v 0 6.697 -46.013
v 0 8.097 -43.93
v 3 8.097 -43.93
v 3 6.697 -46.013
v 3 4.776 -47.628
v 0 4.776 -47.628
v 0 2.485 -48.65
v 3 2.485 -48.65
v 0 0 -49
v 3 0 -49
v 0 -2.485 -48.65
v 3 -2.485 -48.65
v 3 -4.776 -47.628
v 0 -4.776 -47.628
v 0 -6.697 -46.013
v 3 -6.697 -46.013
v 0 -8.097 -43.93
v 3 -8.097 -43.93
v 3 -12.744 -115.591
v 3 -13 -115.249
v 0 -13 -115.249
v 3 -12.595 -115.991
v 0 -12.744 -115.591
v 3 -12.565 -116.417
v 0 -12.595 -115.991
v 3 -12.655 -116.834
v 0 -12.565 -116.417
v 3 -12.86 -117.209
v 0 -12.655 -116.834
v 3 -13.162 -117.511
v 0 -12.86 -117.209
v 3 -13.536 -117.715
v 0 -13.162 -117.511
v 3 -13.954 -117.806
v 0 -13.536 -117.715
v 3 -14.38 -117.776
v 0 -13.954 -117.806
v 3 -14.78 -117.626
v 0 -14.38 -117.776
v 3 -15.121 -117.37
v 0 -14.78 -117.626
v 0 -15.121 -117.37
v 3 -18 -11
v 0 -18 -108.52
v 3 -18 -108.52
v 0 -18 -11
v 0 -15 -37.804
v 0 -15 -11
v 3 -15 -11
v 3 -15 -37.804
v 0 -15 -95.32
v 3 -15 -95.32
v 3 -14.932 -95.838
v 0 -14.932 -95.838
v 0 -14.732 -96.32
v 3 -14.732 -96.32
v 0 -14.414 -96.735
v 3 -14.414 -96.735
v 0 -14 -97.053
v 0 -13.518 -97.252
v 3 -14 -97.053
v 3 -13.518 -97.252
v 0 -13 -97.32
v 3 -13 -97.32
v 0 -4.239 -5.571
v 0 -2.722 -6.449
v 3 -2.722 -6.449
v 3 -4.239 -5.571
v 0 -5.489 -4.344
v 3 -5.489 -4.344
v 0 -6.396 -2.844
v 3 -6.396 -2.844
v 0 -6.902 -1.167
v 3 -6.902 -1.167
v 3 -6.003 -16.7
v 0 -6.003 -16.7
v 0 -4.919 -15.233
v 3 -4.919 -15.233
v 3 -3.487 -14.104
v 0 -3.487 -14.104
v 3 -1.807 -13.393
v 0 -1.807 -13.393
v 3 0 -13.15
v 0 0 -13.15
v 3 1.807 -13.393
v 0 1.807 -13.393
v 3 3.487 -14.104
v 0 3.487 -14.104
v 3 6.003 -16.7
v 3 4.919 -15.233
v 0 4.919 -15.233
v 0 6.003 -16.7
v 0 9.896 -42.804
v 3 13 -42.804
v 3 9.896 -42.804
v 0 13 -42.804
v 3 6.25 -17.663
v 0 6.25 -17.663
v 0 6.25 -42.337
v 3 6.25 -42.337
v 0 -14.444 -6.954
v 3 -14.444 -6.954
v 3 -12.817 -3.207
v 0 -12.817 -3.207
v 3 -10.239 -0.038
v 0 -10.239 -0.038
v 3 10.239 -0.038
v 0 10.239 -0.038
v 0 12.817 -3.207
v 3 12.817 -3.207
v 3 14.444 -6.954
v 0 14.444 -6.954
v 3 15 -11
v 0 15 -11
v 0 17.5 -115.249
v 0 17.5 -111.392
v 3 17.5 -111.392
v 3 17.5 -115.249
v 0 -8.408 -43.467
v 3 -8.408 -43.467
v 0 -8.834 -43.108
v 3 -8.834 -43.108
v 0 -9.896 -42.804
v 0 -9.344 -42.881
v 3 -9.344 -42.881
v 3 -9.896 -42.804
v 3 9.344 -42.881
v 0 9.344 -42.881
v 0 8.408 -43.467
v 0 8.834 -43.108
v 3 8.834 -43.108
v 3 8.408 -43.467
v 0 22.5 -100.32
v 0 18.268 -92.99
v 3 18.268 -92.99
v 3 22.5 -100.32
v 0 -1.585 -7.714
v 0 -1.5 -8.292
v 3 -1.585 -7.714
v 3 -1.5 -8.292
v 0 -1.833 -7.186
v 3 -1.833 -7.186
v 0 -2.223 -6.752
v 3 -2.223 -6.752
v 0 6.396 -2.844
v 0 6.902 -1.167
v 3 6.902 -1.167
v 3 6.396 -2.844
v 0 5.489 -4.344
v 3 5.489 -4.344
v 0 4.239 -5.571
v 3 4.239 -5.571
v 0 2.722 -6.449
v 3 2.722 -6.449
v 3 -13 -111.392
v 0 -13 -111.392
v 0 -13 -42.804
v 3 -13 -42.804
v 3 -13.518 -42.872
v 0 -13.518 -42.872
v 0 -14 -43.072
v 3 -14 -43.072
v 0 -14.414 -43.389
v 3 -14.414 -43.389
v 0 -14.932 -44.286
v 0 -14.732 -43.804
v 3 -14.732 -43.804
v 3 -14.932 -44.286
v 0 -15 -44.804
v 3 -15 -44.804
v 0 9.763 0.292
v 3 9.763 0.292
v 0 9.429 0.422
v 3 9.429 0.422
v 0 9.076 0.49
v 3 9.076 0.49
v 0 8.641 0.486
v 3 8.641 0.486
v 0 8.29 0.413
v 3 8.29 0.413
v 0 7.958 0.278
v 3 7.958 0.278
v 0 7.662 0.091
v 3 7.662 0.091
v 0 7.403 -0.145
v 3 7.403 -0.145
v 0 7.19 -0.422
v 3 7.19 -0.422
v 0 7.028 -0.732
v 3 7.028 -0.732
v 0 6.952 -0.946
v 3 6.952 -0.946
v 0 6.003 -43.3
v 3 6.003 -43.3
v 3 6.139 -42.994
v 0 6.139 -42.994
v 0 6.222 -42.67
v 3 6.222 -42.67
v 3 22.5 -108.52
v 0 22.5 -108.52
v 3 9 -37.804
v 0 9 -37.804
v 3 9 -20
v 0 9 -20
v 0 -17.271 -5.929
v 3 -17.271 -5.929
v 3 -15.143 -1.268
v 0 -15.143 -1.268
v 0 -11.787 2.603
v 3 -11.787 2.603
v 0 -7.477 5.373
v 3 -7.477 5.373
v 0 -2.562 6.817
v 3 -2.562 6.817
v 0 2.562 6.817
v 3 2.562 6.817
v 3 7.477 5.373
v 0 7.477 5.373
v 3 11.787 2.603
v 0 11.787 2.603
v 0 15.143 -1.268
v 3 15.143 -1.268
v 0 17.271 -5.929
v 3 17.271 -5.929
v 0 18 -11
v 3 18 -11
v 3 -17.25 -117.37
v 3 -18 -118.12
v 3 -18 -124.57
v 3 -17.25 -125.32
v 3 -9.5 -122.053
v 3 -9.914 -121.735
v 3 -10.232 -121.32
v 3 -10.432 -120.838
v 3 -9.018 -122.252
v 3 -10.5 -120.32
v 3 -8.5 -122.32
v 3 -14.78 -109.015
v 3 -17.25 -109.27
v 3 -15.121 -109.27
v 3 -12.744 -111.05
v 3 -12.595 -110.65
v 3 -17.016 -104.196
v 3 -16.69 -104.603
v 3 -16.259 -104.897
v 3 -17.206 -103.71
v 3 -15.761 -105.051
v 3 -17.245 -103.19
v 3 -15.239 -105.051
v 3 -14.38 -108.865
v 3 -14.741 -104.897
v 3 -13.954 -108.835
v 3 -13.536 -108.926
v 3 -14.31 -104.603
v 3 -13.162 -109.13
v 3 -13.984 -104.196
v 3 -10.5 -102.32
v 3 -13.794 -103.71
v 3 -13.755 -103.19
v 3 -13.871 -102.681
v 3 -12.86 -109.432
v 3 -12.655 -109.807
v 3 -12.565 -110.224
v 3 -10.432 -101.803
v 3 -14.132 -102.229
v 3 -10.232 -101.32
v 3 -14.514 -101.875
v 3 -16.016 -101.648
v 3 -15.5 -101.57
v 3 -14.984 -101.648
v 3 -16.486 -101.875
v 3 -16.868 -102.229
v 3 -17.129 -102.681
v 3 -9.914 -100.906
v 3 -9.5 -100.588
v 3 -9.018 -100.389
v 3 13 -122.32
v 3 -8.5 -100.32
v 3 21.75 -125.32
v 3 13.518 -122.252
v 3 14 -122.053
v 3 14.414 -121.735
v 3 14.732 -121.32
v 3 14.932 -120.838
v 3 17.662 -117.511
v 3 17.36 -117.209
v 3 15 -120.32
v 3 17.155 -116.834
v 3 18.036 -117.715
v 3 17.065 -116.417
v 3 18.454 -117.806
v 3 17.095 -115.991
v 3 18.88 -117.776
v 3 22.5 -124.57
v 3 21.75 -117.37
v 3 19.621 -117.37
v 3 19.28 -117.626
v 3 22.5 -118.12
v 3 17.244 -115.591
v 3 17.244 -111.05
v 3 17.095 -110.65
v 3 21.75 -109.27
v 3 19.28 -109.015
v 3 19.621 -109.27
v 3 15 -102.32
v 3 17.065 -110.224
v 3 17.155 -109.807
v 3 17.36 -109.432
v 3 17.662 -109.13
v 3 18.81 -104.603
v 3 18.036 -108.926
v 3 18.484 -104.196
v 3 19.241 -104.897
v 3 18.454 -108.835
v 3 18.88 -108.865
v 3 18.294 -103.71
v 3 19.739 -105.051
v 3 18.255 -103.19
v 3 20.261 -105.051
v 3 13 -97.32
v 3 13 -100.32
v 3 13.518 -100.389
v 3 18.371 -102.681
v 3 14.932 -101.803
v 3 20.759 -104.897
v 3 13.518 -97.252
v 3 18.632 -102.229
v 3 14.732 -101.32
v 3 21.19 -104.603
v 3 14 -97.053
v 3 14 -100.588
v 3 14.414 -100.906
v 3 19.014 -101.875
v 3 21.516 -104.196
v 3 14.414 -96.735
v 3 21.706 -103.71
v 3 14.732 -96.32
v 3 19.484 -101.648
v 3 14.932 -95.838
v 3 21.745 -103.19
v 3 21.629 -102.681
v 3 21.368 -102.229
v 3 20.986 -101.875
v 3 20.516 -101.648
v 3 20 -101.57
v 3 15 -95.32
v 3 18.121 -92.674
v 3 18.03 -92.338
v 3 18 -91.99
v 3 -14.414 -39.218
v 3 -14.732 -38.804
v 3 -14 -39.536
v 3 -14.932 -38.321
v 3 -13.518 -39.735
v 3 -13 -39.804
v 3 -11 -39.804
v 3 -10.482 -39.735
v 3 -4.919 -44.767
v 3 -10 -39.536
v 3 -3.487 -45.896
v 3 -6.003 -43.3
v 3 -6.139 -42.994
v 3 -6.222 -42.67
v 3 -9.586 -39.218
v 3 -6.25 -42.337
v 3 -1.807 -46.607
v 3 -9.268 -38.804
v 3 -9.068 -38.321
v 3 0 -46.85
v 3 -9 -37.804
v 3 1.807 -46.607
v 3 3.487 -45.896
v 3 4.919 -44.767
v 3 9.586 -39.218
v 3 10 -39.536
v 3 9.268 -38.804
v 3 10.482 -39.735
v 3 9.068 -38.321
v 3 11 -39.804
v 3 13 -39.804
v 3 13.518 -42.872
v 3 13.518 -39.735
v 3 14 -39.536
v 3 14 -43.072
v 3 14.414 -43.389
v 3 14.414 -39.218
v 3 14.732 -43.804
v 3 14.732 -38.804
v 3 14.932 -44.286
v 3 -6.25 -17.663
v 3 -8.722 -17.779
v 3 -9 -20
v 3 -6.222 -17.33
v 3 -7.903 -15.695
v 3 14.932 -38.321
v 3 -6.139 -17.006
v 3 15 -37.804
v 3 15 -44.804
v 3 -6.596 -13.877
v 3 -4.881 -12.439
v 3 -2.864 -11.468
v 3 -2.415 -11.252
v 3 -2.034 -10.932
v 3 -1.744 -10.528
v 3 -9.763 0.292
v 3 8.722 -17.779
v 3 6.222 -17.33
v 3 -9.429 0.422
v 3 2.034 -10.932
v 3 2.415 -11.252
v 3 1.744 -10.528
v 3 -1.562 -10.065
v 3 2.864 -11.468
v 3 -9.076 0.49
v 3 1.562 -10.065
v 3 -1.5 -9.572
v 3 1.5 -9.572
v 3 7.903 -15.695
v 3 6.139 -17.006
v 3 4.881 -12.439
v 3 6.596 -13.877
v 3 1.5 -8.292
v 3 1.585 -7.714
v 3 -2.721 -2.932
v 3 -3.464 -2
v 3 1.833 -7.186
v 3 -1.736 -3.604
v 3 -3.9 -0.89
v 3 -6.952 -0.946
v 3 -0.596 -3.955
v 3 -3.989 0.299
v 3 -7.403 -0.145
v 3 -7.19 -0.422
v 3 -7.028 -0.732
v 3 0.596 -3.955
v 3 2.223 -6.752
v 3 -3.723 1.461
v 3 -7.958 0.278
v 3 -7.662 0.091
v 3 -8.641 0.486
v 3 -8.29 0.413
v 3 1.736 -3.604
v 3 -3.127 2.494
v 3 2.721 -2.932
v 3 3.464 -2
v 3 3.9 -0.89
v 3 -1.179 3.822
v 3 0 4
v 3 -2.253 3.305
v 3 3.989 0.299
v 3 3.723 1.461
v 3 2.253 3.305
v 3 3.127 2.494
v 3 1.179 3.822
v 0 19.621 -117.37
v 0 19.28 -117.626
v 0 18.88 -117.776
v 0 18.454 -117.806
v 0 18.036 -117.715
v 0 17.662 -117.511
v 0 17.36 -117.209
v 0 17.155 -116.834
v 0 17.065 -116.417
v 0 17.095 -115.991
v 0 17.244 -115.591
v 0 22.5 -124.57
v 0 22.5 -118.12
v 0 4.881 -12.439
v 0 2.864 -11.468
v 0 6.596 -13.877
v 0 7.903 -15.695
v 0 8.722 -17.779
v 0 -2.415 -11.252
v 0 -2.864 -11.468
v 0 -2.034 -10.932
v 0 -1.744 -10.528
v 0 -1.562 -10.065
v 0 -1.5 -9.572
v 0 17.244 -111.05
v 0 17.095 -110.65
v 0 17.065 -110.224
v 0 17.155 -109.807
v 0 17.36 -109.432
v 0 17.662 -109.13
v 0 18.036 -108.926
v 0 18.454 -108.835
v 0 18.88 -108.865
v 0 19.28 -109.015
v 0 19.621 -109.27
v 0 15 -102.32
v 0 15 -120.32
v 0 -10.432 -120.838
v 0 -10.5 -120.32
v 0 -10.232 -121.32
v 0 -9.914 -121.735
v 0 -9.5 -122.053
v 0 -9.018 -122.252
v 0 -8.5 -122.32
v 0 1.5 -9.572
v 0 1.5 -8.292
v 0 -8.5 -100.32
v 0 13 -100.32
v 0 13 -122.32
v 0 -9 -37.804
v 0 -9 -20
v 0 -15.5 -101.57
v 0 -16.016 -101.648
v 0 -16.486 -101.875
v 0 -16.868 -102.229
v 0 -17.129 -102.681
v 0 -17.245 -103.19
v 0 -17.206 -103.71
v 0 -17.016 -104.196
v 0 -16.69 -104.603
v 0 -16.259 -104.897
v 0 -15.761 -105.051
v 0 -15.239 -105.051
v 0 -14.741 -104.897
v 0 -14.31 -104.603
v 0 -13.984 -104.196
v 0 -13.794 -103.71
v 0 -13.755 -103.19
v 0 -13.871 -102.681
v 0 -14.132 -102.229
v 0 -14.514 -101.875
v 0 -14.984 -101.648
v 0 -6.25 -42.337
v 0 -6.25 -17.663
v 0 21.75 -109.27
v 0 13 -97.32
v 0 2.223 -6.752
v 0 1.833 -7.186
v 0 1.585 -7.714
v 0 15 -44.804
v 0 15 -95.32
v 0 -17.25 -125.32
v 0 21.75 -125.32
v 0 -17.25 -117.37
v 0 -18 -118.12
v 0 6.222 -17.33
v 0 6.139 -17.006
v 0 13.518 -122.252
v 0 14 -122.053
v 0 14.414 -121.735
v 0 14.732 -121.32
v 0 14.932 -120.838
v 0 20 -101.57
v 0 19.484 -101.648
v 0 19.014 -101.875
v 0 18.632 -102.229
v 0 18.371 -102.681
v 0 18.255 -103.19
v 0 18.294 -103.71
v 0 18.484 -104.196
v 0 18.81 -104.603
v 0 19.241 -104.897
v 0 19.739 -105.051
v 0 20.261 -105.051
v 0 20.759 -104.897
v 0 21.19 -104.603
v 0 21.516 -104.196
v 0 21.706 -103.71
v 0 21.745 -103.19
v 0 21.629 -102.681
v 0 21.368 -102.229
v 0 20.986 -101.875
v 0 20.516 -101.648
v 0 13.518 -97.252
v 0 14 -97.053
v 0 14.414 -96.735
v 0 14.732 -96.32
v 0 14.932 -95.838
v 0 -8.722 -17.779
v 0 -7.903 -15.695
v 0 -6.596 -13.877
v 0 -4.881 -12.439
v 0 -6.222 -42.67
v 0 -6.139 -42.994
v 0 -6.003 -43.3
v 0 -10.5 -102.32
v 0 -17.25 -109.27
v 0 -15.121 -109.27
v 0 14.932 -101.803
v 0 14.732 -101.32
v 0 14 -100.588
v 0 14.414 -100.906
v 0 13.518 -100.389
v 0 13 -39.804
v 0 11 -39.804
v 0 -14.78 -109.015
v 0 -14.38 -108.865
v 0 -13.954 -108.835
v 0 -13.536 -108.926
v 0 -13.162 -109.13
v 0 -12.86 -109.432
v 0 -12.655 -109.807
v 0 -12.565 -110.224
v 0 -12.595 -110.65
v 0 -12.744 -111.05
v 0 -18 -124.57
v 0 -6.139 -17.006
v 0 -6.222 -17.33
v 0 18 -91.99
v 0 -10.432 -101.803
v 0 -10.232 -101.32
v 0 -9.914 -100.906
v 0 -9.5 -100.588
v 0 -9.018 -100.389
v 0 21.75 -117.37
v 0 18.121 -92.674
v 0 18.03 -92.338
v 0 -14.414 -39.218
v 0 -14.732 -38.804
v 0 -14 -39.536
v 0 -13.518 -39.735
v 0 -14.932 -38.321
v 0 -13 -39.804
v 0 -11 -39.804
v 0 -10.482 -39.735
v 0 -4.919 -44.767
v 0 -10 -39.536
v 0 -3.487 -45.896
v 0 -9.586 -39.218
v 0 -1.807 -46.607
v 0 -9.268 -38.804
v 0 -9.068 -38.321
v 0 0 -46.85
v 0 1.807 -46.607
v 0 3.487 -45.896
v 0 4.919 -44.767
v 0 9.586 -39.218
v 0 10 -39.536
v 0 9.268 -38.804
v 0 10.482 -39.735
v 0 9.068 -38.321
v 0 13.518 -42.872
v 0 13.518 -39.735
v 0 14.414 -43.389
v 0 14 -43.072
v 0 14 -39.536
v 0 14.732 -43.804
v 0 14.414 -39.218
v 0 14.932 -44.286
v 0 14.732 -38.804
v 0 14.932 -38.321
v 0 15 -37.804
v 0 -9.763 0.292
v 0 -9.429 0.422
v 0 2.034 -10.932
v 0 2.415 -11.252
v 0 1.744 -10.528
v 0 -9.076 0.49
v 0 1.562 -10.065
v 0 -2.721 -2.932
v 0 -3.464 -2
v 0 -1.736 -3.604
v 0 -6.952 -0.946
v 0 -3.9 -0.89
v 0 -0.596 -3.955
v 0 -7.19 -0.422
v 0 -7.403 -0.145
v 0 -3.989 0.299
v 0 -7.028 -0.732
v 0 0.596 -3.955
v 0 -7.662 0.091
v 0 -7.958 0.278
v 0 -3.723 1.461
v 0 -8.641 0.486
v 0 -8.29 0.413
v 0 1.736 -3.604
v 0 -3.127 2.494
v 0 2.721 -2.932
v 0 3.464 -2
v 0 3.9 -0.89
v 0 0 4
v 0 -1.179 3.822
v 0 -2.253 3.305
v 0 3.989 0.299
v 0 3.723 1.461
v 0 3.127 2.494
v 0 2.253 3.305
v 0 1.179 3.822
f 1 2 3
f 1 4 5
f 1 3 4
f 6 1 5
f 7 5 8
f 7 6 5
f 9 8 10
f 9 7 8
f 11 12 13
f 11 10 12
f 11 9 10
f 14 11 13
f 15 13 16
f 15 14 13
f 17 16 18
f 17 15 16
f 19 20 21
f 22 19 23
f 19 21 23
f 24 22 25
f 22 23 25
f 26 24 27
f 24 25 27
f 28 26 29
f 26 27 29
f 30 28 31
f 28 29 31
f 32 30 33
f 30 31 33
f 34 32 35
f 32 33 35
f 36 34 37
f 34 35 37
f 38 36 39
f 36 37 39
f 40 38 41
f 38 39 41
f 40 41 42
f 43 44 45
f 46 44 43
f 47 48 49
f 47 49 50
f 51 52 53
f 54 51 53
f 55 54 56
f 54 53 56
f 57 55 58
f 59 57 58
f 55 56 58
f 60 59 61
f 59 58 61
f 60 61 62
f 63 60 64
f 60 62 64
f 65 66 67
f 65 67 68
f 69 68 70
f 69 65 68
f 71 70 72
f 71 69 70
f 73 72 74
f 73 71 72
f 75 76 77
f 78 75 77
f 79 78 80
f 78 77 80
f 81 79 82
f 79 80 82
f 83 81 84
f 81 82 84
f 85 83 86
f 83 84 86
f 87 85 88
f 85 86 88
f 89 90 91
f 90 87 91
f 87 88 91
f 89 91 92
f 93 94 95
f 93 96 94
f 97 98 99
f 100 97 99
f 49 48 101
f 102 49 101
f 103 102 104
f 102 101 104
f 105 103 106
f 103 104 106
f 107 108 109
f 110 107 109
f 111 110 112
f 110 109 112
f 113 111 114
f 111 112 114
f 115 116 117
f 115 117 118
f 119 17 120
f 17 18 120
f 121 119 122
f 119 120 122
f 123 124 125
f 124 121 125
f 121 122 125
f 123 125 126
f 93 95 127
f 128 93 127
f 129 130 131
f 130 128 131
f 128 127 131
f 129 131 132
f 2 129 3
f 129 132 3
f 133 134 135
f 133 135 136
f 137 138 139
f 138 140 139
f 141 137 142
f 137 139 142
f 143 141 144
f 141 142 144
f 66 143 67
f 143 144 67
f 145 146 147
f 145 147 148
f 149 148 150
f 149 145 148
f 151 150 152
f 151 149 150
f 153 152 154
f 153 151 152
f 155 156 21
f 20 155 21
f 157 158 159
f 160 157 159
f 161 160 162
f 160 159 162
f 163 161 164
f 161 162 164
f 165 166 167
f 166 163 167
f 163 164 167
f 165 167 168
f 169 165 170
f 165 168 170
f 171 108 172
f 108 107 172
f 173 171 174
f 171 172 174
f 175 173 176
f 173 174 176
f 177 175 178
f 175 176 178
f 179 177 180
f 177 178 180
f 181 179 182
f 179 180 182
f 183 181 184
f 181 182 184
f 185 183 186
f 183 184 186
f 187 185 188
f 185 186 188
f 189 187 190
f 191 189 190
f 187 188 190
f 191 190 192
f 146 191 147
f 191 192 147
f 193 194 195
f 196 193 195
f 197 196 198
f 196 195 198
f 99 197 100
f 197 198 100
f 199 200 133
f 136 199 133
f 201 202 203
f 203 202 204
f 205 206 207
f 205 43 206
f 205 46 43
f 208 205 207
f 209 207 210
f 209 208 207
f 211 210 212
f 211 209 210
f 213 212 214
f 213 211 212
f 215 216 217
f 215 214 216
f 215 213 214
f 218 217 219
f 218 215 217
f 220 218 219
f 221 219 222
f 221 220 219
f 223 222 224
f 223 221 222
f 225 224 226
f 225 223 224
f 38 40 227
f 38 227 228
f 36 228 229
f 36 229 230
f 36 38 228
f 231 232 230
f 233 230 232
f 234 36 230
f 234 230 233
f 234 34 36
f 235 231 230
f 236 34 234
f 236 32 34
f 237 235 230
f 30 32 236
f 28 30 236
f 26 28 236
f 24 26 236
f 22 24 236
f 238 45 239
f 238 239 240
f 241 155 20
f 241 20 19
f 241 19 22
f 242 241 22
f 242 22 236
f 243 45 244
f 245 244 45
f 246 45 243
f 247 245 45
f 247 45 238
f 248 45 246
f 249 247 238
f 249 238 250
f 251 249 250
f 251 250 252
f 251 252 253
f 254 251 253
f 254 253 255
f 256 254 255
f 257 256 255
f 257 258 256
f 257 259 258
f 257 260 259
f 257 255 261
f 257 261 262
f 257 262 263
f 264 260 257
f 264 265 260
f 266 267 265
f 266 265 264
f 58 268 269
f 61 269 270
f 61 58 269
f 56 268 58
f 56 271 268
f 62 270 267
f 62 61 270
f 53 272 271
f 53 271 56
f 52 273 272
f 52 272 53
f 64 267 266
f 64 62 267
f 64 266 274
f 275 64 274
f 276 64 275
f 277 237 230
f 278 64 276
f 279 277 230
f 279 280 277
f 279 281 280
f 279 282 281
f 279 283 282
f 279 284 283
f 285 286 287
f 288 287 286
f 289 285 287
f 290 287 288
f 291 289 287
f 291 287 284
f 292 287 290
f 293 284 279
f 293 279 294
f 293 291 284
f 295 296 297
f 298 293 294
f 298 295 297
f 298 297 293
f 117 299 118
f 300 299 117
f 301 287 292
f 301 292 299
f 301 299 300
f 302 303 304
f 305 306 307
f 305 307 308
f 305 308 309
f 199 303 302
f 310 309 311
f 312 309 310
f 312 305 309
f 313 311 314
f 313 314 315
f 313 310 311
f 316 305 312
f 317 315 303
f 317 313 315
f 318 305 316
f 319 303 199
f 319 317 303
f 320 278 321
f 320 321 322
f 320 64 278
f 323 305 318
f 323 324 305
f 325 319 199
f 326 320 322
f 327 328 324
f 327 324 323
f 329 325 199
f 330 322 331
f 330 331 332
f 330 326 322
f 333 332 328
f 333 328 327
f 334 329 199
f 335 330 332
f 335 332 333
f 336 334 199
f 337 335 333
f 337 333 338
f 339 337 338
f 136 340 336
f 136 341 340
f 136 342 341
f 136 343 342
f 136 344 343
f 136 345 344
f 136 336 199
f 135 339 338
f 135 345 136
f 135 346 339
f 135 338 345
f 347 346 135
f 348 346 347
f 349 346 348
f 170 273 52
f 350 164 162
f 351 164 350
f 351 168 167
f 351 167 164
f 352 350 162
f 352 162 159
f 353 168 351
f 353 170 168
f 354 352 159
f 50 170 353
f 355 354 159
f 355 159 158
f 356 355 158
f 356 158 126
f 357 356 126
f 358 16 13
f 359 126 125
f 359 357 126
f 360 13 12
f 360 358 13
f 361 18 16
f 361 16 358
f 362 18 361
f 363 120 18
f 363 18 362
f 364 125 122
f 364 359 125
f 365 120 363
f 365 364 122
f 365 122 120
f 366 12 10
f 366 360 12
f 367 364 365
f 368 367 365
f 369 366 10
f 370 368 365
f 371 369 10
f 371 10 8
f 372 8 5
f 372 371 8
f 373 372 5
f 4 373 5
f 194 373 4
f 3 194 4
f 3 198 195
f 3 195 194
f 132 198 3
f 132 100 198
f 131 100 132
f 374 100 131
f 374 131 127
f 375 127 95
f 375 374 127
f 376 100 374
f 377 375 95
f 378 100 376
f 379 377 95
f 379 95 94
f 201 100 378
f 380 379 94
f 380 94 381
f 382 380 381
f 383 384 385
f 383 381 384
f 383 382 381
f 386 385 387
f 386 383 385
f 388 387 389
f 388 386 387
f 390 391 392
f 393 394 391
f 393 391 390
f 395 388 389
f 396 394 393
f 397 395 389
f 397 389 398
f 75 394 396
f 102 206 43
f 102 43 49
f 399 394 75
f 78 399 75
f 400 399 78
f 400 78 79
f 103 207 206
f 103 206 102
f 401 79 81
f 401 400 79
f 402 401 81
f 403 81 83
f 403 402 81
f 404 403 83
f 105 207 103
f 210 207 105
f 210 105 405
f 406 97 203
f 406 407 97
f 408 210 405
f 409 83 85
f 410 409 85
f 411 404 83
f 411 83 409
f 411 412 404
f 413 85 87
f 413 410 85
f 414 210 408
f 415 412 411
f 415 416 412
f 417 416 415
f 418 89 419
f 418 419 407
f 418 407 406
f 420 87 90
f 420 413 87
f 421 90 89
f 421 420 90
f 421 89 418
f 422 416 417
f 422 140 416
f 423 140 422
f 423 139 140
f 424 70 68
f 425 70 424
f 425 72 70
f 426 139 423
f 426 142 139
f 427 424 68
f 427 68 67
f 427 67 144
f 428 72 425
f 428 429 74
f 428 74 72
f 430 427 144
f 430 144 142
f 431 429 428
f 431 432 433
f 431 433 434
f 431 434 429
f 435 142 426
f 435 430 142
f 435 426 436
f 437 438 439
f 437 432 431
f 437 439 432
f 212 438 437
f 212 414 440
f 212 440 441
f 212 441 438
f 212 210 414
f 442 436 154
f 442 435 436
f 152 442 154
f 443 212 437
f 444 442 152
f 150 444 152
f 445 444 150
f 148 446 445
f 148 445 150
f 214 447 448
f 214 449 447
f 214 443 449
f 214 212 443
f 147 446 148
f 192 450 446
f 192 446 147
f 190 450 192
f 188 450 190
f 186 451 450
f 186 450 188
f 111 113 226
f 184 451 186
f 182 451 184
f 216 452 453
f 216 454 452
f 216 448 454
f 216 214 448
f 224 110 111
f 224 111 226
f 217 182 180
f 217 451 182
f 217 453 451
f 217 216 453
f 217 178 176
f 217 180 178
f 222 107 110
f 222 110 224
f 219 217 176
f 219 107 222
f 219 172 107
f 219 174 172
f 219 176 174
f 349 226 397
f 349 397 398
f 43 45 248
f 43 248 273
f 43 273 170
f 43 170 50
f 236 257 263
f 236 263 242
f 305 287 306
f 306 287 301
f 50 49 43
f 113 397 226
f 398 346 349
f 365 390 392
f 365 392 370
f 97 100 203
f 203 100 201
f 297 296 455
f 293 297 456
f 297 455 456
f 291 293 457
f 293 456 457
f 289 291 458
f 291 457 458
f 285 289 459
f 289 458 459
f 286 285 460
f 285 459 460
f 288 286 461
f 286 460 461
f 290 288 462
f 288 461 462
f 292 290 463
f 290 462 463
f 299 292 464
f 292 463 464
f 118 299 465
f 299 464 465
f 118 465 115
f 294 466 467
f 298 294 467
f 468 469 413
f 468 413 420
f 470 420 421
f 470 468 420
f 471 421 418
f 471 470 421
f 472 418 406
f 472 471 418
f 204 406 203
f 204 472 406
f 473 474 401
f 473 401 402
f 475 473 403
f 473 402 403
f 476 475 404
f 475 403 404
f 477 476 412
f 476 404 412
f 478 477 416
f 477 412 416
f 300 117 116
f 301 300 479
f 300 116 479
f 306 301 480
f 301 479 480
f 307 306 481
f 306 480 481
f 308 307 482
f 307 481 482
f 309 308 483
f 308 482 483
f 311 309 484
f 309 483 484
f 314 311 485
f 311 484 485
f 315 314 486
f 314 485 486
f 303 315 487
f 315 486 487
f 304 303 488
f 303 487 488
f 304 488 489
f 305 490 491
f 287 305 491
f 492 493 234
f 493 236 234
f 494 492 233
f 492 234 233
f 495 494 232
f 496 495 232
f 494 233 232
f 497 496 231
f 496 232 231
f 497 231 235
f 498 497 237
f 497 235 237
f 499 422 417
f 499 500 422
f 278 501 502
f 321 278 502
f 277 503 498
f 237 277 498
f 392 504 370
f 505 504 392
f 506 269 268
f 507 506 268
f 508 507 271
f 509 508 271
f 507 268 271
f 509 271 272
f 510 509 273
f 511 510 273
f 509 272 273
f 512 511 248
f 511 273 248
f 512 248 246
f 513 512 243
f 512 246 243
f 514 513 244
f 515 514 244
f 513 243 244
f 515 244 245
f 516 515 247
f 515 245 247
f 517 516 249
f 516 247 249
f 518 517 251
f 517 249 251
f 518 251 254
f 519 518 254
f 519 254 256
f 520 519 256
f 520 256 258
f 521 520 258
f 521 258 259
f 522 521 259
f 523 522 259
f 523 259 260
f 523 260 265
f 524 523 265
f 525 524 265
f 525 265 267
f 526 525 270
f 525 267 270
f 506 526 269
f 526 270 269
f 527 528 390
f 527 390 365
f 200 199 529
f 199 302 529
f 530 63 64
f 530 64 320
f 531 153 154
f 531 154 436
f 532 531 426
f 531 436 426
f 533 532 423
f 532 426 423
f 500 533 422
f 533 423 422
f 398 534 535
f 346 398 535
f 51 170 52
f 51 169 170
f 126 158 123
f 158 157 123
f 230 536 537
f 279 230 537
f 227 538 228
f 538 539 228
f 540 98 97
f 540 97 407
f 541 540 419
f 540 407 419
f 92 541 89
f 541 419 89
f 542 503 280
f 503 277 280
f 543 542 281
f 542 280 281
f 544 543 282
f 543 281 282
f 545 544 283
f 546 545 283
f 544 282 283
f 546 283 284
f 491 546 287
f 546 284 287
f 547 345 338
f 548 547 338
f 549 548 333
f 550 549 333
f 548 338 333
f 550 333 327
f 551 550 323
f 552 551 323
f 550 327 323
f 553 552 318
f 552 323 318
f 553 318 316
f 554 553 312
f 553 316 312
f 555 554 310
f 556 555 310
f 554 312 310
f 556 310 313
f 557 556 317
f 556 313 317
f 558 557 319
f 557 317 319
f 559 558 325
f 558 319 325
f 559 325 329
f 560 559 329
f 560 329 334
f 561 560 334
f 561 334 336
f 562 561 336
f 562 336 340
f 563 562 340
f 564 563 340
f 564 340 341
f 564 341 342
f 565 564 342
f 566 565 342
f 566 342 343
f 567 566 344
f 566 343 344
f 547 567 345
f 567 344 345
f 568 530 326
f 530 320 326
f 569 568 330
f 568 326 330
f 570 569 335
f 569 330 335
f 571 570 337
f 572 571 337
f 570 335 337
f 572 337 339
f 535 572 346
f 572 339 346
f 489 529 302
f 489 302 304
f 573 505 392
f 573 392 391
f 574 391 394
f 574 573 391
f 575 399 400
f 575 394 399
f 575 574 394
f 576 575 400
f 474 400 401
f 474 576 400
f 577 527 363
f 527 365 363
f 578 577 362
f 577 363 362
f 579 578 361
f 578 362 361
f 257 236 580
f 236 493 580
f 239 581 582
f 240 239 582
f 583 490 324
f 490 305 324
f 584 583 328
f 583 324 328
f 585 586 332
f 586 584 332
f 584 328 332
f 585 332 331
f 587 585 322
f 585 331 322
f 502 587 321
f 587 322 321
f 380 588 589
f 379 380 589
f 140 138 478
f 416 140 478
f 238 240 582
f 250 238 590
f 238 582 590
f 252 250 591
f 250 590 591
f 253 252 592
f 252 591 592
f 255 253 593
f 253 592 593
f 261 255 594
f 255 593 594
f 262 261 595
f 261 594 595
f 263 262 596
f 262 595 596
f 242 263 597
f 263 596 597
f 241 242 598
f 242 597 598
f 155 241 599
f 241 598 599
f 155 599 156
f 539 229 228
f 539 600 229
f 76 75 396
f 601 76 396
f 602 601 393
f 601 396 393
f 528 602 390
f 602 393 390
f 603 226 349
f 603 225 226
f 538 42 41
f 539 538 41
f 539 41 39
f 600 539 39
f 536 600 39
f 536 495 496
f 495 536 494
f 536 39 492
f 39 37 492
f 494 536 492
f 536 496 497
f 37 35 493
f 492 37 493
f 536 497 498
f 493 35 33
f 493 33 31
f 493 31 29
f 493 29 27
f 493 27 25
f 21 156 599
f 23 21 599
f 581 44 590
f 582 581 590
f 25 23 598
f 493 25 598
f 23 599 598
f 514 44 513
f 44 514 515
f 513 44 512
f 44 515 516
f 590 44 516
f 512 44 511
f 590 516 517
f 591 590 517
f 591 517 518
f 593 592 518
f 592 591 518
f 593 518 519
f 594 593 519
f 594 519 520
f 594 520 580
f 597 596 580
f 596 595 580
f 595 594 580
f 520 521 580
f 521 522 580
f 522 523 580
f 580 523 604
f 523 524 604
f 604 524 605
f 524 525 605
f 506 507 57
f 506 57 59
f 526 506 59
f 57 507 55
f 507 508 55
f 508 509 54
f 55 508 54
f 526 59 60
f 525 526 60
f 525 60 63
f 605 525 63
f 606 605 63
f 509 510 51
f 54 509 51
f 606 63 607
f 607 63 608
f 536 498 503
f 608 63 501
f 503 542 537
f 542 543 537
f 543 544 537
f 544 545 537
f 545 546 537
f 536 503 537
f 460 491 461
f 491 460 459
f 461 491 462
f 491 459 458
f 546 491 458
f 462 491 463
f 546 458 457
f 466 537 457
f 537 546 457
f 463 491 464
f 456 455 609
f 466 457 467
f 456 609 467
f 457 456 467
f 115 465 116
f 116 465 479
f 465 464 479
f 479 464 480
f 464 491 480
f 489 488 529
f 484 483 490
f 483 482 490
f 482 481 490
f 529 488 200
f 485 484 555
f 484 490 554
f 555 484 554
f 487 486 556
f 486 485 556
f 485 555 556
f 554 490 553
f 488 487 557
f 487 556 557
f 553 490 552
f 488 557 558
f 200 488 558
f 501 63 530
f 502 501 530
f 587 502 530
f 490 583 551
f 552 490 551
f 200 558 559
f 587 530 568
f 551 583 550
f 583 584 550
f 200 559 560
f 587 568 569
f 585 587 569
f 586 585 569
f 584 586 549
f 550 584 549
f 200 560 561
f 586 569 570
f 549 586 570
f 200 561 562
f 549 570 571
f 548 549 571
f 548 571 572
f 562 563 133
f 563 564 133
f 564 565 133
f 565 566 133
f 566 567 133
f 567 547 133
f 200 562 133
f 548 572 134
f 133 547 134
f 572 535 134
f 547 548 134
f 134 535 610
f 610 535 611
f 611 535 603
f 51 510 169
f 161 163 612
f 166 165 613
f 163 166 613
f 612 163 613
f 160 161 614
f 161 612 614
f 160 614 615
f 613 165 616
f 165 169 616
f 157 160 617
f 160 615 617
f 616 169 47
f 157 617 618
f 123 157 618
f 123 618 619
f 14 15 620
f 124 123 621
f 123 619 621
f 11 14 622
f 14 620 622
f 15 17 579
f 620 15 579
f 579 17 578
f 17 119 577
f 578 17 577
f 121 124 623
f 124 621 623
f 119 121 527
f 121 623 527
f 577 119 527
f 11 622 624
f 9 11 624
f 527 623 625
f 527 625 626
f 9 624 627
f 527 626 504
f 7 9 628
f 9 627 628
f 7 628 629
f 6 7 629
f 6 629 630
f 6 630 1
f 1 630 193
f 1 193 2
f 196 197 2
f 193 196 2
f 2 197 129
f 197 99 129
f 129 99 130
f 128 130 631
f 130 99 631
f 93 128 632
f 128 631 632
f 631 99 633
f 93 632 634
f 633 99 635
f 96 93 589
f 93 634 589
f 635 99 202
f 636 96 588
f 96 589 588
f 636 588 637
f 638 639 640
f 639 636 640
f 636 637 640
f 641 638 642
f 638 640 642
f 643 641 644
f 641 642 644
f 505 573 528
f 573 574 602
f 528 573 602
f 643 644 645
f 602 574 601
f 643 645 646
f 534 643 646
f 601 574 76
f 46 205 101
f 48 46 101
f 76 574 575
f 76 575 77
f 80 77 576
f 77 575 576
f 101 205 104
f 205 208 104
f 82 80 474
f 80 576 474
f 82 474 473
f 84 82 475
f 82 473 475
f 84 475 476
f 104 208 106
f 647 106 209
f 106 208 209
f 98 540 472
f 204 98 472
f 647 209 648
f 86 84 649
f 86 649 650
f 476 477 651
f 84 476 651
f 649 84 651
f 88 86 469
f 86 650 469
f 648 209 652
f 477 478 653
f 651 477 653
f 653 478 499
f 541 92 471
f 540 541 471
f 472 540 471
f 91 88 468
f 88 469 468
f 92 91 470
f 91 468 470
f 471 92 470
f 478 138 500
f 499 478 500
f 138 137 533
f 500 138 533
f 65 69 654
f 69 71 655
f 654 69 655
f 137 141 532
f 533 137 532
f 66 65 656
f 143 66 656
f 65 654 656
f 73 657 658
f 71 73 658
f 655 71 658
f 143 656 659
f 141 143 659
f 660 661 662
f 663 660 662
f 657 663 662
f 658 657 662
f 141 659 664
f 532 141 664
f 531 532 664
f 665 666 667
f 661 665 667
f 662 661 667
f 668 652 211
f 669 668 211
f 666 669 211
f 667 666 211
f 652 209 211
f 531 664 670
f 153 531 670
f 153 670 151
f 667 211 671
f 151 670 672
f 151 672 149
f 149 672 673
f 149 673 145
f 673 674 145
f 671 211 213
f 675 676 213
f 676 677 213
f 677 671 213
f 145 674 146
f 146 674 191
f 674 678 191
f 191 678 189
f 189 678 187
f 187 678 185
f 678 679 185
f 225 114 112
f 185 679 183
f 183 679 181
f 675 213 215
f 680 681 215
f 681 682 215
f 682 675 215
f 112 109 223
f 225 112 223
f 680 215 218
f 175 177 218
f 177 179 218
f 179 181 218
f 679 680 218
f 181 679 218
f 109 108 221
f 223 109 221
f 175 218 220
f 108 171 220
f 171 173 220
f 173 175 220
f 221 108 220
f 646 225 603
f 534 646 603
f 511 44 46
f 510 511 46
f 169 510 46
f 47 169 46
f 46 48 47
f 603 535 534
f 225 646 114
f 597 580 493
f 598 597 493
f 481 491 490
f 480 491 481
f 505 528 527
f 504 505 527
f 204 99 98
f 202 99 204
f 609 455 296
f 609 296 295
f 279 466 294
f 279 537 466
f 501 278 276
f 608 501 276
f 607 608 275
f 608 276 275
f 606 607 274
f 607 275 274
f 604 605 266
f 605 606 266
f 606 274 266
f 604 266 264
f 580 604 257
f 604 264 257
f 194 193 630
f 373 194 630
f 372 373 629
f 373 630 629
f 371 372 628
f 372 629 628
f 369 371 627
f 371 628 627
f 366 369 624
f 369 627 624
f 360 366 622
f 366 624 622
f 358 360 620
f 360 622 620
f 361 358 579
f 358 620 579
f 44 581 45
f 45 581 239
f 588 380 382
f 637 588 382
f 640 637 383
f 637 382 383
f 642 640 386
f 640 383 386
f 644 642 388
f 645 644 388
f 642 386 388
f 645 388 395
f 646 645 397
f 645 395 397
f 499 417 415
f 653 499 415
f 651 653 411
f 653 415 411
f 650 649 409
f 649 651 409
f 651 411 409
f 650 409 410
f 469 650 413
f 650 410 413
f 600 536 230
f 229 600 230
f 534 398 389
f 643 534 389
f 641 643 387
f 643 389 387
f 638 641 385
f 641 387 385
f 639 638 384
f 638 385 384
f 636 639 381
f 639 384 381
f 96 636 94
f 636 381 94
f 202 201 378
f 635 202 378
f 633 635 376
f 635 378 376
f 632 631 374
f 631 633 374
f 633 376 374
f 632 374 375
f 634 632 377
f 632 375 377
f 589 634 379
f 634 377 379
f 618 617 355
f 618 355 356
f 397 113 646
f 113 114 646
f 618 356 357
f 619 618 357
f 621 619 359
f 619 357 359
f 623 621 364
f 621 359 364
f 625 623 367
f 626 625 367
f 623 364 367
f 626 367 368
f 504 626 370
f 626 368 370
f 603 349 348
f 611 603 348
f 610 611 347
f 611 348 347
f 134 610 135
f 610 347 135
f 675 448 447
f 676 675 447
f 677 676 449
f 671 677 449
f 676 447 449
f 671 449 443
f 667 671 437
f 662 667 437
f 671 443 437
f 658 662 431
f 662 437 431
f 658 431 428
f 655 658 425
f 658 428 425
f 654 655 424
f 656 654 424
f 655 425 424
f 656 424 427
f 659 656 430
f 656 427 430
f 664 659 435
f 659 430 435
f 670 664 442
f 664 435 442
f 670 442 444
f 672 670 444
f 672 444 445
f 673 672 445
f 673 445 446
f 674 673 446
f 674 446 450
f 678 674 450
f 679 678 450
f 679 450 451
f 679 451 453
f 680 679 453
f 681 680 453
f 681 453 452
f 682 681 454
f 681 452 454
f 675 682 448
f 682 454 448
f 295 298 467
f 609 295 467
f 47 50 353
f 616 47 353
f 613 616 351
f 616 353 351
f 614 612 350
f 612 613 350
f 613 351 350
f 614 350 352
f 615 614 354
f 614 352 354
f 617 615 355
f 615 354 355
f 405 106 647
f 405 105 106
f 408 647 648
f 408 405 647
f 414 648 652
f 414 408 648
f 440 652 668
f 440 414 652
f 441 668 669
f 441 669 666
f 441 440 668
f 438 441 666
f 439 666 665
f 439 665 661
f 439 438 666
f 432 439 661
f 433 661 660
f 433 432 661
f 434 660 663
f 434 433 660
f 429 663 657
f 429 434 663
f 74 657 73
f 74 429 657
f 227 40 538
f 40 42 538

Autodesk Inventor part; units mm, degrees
ref_plane "YZ Plane" through (0, 0, 0) normal (1, 0, 0) x (0, 1, 0)
ref_plane "XZ Plane" through (0, 0, 0) normal (0, 1, 0) x (-1, 0, 0)
ref_plane "XY Plane" through (0, 0, 0) normal (0, 0, 1) x (1, 0, 0)
sketch "Sketch1" plane through (0, 0, 0) normal (1, 0, 0) x (0, 1, 0)
  arc A0 (6.25, -17.1964) -> (-6.25, -17.1964) centre (0, -20) ccw
  line L0 (-6.25, -17.1964) -> (-6.25, -42.8036)
  line L1 (-6.25, -30) -> (6.25, -30) construction
  line L2 (0, 0) -> (0, -137.3205) construction
  arc A1 (-6.25, -42.8036) -> (6.25, -42.8036) centre (0, -40) ccw
  circle A2 centre (0, 0) radius 40 construction
  circle A3 centre (0, -20) radius 20 construction
  line L3 (6.25, -17.1964) -> (6.25, -42.8036)
  line L4 (0, 0) -> (17.3205, -10) construction
  line L5 (17.3205, -10) -> (34.641, -20) construction
  line L6 (-25, -137.3205) -> (25, -137.3205) construction
  line L7 (-18, -125.3205) -> (-18, -29)
  line L8 (22.5, -125.3205) -> (22.5, -100.3205)
  line L9 (-25, -120) -> (25, -120) construction
  line L10 (25, -120) -> (25, -137.3205) construction
  line L11 (-25, -120) -> (-25, -137.3205) construction
  line L12 (22.5, -109.2705) -> (17.5, -109.2705)
  line L13 (17.5, -109.2705) -> (17.5, -117.3705)
  line L14 (17.5, -117.3705) -> (22.5, -117.3705)
  line L15 (-15, -106.3205) -> (17.5, -106.3205) construction
  line L16 (17.5, -106.3205) -> (17.5, -149.3205) construction
  line L17 (17.5, -149.3205) -> (-15, -149.3205) construction
  line L18 (-15, -149.3205) -> (-15, -106.3205) construction
  line L19 (-15, -106.3205) -> (17.5, -149.3205) construction
  line L20 (17.5, -106.3205) -> (-15, -149.3205) construction
  line L21 (1.25, -106.3205) -> (1.25, -149.3205) construction
  line L22 (22.5, -109.3205) -> (17.5, -109.3205) construction
  line L23 (17.5, -117.3205) -> (22.5, -117.3205) construction
  line L24 (17.5, -113.3205) -> (22.5, -113.3205) construction
  line L25 (-18, -100.3205) -> (22.5, -100.3205) construction
  circle A4 centre (0, 0) radius 4 construction
  circle A5 centre (20, -103.3205) radius 1.75 construction
  line L26 (20, -103.3205) -> (20, -123.3205) construction
  circle A6 centre (20, -123.3205) radius 1.75 construction
  line L27 (-18, -109.2705) -> (-13, -109.2705)
  line L28 (-13, -109.2705) -> (-13, -117.3705)
  line L29 (-13, -117.3705) -> (-18, -117.3705)
  line L30 (-15.5, -103.3205) -> (-15.5, -123.3205) construction
  line L31 (-15.5, -103.3205) -> (20, -103.3205) construction
  line L32 (-15.5, -123.3205) -> (20, -123.3205) construction
  arc A7 (-4.4, -42.3749) -> (4.4, -42.3749) centre (0, -40) ccw construction
  arc A8 (4.4, -17.6251) -> (-4.4, -17.6251) centre (0, -20) ccw construction
  line L33 (-4.4, -17.6251) -> (-4.4, -42.3749) construction
  line L34 (4.4, -42.3749) -> (4.4, -17.6251) construction
  line L35 (-18, -29) -> (-18, -11)
  circle A9 centre (0, 0) radius 7 construction
  arc A10 (18, -11) -> (-18, -11) centre (0, -11) ccw
  line L36 (18, -11) -> (18, -92.5263)
  line L37 (18, -92.5263) -> (22.5, -100.3205)
  line L38 (-15, -42.8036) -> (-15, -97.3205)
  line L39 (-15, -97.3205) -> (15, -97.3205)
  line L40 (15, -42.8036) -> (15, -97.3205)
  line L41 (-10.5, -100.3205) -> (15, -100.3205)
  line L42 (15, -100.3205) -> (15, -122.3205)
  line L43 (15, -122.3205) -> (-10.5, -122.3205)
  line L44 (-10.5, -122.3205) -> (-10.5, -100.3205)
  line L45 (-15, -39.8036) -> (-9, -39.8036)
  arc A11 (-6.5383, 2.5) -> (-15, -11) centre (0, -11) ccw
  arc A12 (-6.5383, 2.5) -> (-1.5, -6.8374) centre (0, 0) ccw
  line L46 (-15, -11) -> (-15, -39.8036)
  line L47 (9, -39.8036) -> (9, -20)
  line L48 (15, -39.8036) -> (9, -39.8036)
  arc A13 (15, -11) -> (6.5383, 2.5) centre (0, -11) ccw
  arc A14 (1.5, -6.8374) -> (6.5383, 2.5) centre (0, 0) ccw
  line L49 (15, -11) -> (15, -39.8036)
  arc A15 (-8.5522, -42.8036) -> (8.5522, -42.8036) centre (0, -40) ccw
  line L50 (-15, -42.8036) -> (-8.5522, -42.8036)
  line L51 (-9, -39.8036) -> (-9, -20)
  arc A16 (-1.5, -11.1259) -> (-9, -20) centre (0, -20) ccw
  line L52 (-1.5, -6.8374) -> (-1.5, -11.1259)
  line L53 (15, -42.8036) -> (8.5522, -42.8036)
  arc A17 (9, -20) -> (1.5, -11.1259) centre (0, -20) ccw
  line L54 (1.5, -6.8374) -> (1.5, -11.1259)
  line L55 (-18, -137.3205) -> (-18, -100.3205) construction
  circle A18 centre (-15.5, -103.3205) radius 1.75 construction
  line L56 (22.5, -100.3205) -> (22.5, -137.3205) construction
  line L57 (-18, -125.3205) -> (22.5, -125.3205)
  arc A19 (19.6213, -109.2705) -> (17.5, -111.3918) centre (18.5607, -110.3312) ccw
  arc A20 (17.5, -115.2492) -> (19.6213, -117.3705) centre (18.5607, -116.3098) ccw
  arc A21 (-13, -111.3918) -> (-15.1213, -109.2705) centre (-14.0607, -110.3312) ccw
  arc A22 (-15.1213, -117.3705) -> (-13, -115.2492) centre (-14.0607, -116.3098) ccw
  line L58 (2.25, -122.3205) -> (2.25, -100.3205) construction
  point P0 (5.3819, -44.2376)
  point P1 (6.25, -41.5156)
  point P2 (17.5, -112.2705)
  point P3 (17.5, -114.3705)
  point P4 (1.25, -127.8205)
  point P5 (-13, -111.3918)
  point P6 (-13, -114.8191)
  point P7 (9, -20)
  point P8 (-13, -115.2492)
  point P9 (19.6213, -117.3705)
  point P10 (17.5, -115.2492)
  point P11 (17.5, -111.3918)
  dimension "d2" = 12.5
  dimension "d3" = 60
  dimension "d4" = 20
  dimension "d5" = 20
  dimension "d6" = 20
  dimension "d12" = 17.3205
  dimension "d13" = 120
  dimension "d17" = 32.5
  dimension "d18" = 43
  dimension "d19" = 9.5
  dimension "d21" = 0.05
  dimension "d24" = 3
  dimension "d25" = 9
  dimension "d26" = 6
  dimension "d36" = 8
  dimension "d48" = 50
  dimension "d50" = 3
  dimension "d51" = 3.5
  dimension "d56" = 8.8
  dimension "d57" = 5
  dimension "d58" = 1.85
  dimension "d59" = 1.85
  dimension "d65" = 14
  dimension "d66" = 30
  dimension "d70" = 3
  dimension "d74" = 3
  dimension "d81" = 7
  dimension "d82" = 5
  dimension "d85" = 5
  dimension "d86" = 2.5
  dimension "d91" = 8
  dimension "d92" = 8
  dimension "d93" = 3
  dimension "d95" = 3
  dimension "d96" = 3
  dimension "d97" = 9
  dimension "d99" = 1.5
extrude "Extrusion1" add sketch "Sketch1" along normal blind 3 contours L7 L29 A22 L28 A21 L27 L35 A10 L36 L37 L8 L12 A19 L13 A20 L14 L57
hole "Phi8.0-H7" at (0, 0, 0) direction (1, 0, 0) diameter 8 end through all
hole "Phi3.5" at (0, 20, -103.3205) at (0, -15.5, -103.3205) direction (1, 0, 0) diameter 3.5 end through all
fillet "R2" radius 2 25 edges at (1.5, -6.25, -17.1964) (1.5, -6.25, -42.8036) (1.5, 6.25, -42.8036) (1.5, 6.25, -17.1964) (1.5, 18, -92.5263) (1.5, -6.5383, 2.5) (1.5, -1.5, -6.8374) (1.5, 1.5, -6.8374) (1.5, 6.5383, 2.5) (1.5, -1.5, -11.1259) (1.5, 1.5, -11.1259) (1.5, -15, -39.8036) (1.5, -9, -39.8036) (1.5, 9, -39.8036) (1.5, 15, -39.8036) (1.5, 15, -97.3205) (1.5, -15, -97.3205) (1.5, -15, -42.8036) (1.5, -8.5522, -42.8036) (1.5, 8.5522, -42.8036) (1.5, 15, -42.8036) (1.5, 15, -122.3205) (1.5, 15, -100.3205) (1.5, -10.5, -100.3205) (1.5, -10.5, -122.3205)
chamfer "C0.5" distance 0.75 angle 45 6 edges at (1.5, 22.5, -109.2705) (1.5, 22.5, -117.3705) (1.5, -18, -117.3705) (1.5, -18, -109.2705) (1.5, -18, -125.3205) (1.5, 22.5, -125.3205)
equation "\"d6\" = d4"
properties part number "UpperArmFrame" material "CFRP"
